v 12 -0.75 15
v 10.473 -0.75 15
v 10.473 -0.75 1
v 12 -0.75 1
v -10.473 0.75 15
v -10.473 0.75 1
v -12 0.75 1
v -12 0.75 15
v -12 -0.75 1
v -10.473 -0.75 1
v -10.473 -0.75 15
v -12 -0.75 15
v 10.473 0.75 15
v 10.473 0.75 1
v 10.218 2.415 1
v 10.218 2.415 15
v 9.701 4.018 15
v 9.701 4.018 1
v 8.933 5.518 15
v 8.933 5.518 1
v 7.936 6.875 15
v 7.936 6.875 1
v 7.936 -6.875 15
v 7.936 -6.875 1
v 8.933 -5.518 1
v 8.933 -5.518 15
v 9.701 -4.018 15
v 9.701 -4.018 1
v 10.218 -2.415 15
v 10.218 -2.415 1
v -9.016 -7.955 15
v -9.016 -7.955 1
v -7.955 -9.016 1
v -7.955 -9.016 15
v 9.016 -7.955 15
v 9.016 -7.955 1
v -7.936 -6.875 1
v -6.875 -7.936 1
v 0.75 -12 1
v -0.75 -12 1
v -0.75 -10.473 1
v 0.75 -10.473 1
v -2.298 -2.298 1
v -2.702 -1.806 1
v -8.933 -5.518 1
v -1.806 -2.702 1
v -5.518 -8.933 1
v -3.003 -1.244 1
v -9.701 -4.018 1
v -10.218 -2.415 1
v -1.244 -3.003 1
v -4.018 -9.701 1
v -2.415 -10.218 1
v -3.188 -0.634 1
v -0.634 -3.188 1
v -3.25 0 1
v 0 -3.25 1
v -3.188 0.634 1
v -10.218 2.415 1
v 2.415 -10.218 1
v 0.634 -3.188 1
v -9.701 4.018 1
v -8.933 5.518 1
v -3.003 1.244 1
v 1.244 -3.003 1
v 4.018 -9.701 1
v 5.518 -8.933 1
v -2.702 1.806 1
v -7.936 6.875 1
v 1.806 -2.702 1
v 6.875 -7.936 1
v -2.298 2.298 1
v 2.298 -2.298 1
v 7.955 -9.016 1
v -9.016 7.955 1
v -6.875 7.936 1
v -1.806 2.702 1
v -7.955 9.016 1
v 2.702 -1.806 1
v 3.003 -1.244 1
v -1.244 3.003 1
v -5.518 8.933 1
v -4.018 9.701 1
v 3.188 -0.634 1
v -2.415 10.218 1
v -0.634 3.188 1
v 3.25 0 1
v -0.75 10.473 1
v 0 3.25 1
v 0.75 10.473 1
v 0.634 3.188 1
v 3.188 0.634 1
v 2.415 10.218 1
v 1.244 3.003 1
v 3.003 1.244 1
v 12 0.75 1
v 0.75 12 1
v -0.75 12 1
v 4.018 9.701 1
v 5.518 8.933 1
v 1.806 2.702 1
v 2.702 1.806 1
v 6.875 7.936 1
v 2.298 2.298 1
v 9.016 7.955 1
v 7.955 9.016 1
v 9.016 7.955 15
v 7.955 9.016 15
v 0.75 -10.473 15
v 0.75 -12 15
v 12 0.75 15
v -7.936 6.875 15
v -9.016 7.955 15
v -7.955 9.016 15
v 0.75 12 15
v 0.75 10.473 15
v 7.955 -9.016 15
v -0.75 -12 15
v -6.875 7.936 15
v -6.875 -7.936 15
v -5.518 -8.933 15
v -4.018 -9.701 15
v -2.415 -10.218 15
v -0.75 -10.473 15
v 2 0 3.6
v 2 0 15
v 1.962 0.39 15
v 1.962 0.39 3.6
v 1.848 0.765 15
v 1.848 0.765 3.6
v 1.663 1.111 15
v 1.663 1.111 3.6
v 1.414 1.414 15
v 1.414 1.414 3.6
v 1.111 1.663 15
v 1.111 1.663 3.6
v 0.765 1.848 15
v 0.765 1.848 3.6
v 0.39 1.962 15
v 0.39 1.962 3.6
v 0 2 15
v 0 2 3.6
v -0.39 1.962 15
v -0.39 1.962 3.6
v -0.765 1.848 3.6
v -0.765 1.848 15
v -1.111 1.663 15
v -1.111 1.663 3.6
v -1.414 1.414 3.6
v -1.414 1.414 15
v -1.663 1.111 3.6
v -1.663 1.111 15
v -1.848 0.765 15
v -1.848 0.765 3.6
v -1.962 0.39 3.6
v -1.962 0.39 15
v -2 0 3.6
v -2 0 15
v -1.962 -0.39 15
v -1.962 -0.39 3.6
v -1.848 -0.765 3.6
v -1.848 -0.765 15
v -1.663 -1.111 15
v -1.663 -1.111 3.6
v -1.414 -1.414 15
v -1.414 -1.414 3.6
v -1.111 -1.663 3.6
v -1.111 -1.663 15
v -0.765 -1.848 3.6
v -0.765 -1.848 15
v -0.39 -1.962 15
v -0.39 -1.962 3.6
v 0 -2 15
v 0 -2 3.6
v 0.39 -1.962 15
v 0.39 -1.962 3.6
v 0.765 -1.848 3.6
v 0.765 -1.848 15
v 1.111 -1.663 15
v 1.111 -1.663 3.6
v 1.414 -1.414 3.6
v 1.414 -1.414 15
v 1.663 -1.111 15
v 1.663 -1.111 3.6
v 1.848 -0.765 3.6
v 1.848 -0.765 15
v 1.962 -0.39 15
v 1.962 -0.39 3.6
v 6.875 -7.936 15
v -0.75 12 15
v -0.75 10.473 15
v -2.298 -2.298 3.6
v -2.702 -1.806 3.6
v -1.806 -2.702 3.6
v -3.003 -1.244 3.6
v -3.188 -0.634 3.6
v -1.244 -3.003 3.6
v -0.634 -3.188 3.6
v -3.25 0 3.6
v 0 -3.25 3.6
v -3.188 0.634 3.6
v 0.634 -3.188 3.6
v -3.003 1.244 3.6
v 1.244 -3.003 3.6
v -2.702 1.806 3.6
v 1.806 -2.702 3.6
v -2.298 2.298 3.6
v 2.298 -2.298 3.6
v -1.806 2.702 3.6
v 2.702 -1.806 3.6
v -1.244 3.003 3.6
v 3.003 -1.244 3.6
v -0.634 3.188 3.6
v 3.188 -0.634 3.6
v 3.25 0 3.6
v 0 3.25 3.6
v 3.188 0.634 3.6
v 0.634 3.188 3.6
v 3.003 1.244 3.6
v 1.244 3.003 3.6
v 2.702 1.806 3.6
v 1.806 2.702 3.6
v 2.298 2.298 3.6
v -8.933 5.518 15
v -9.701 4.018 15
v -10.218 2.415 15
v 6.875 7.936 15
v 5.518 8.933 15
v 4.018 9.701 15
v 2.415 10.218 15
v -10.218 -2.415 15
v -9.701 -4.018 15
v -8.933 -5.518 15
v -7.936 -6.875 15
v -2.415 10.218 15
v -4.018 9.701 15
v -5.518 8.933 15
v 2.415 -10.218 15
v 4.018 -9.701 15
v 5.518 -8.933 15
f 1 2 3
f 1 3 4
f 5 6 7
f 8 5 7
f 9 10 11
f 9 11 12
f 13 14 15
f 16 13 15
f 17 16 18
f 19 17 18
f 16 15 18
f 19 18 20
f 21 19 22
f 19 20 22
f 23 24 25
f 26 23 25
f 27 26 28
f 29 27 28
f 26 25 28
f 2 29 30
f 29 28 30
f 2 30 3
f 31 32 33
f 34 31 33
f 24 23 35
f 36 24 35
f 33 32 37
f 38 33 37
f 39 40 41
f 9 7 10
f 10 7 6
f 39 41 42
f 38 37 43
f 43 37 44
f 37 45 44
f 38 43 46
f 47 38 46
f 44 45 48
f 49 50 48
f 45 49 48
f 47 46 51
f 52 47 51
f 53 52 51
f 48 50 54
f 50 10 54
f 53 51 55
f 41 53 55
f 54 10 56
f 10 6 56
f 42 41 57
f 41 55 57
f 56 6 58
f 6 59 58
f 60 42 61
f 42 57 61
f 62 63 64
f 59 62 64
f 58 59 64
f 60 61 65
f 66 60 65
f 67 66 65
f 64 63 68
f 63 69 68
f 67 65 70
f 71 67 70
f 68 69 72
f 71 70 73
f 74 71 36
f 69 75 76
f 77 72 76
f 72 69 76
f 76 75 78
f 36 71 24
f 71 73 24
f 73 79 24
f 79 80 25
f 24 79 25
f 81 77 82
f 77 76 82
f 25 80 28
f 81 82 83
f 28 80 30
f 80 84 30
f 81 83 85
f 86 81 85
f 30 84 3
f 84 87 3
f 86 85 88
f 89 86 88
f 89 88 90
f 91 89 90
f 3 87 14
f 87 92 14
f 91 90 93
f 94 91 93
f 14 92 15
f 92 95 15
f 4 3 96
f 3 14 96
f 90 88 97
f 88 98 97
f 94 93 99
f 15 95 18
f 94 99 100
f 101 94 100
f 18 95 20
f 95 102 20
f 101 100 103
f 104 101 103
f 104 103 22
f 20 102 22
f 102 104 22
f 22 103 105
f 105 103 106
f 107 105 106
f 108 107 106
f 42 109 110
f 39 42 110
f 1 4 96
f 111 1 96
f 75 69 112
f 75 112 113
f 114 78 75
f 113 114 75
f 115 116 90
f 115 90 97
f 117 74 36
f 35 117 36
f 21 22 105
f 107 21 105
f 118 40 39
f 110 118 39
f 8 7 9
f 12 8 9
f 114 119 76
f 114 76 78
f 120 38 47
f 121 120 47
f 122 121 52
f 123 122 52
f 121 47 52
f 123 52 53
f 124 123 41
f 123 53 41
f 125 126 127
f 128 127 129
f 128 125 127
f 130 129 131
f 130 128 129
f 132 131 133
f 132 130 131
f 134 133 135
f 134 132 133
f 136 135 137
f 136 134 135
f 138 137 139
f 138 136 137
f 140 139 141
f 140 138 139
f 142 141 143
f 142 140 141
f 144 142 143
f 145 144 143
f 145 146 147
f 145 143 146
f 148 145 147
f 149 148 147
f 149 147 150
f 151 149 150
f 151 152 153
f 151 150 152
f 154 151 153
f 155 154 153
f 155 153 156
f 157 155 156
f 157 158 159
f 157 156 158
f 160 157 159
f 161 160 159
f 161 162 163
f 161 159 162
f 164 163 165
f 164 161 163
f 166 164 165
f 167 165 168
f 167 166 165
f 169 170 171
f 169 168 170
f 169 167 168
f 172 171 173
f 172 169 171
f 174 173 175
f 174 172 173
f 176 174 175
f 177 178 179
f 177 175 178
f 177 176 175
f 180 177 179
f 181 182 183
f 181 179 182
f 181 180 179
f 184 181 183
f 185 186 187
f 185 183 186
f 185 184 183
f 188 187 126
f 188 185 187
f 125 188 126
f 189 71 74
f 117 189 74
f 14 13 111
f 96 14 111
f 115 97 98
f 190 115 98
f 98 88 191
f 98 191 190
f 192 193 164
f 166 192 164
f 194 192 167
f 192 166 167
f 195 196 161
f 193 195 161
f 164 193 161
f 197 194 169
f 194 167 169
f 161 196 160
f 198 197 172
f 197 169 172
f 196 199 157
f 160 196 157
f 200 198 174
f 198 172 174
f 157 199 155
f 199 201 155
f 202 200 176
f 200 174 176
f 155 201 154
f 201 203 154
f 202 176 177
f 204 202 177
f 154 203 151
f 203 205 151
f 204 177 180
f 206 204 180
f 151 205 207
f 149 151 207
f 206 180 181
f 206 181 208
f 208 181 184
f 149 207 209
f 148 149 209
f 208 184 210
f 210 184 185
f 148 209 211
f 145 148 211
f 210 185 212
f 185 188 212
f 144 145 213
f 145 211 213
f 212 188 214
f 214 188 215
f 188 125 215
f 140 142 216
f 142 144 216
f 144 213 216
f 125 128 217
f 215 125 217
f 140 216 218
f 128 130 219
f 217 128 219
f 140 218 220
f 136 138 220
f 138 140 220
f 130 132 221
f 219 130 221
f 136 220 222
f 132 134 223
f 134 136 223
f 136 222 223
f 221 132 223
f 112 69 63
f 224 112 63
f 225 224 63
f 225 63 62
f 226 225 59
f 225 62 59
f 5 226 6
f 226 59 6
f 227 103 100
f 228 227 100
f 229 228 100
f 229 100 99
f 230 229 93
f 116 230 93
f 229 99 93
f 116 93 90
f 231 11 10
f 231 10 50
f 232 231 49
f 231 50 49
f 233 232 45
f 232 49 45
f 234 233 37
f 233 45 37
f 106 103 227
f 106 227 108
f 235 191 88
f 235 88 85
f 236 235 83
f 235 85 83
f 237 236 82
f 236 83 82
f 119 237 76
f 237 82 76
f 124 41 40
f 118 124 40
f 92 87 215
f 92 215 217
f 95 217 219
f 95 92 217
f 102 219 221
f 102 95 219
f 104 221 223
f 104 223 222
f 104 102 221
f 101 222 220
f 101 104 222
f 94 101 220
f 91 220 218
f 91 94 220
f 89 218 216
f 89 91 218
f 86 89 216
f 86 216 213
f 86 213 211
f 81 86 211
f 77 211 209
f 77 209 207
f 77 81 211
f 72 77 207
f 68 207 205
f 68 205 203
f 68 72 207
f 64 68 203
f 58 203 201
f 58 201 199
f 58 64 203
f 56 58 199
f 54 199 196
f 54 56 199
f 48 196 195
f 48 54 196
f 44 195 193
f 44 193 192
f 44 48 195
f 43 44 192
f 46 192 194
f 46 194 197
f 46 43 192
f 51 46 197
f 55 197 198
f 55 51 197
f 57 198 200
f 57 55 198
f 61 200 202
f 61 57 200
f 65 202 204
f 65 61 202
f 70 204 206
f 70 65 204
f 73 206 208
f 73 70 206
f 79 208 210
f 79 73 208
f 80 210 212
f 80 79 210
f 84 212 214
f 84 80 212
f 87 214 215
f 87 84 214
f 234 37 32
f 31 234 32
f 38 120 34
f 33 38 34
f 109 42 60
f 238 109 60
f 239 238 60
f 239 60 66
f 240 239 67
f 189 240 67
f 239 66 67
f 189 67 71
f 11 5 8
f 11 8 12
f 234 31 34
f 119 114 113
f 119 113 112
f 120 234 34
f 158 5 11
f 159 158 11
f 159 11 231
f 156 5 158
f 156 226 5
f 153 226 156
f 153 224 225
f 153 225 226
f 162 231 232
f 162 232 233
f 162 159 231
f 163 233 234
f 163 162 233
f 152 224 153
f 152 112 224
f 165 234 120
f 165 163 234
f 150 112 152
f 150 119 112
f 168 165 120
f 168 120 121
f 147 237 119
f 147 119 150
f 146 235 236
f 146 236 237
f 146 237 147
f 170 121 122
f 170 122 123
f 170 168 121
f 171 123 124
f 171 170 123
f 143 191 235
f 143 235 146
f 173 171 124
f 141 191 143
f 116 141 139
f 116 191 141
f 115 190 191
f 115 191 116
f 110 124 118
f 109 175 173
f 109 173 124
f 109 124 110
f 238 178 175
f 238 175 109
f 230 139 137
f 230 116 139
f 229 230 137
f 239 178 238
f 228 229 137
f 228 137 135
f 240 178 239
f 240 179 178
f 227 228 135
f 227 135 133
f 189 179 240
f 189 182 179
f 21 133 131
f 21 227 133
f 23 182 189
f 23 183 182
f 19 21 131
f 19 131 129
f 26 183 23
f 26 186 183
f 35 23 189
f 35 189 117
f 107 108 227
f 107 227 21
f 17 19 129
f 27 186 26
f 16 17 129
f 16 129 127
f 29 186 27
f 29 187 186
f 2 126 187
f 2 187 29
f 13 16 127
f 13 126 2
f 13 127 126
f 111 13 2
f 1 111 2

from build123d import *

# Parameters (mm, degrees)
CYLINDER057_R     = 2
CYLINDER057_DEPTH = 13
CYLINDER059_R     = 3.25
CYLINDER059_DEPTH = 2.6
BOX019_W          = 6
BOX019_H          = 1.5
BOX019_DEPTH      = 14
ARRAY004_COUNT    = 8
CYLINDER055_R     = 10.5
CYLINDER055_DEPTH = 14


with BuildPart() as cylinder052:
    # Cylinder057 → Cylinder057 (new body)
    with BuildSketch(Plane.XY.offset(3.6)):
        Circle(CYLINDER057_R)
    extrude(amount=CYLINDER057_DEPTH)


with BuildPart() as cylinder054:
    # Cylinder059 → Cylinder059 (new body)
    with BuildSketch(Plane.XY.offset(1)):
        Circle(CYLINDER059_R)
    extrude(amount=CYLINDER059_DEPTH)


with BuildPart() as array004:
    # Box019 → Box019 (new body)
    with BuildSketch(Plane(origin=(6, -0.75, 0), x_dir=(1, 0, 0), z_dir=(0, 0, 1))):
        with Locations((3, 0.75)):
            Rectangle(BOX019_W, BOX019_H)
    extrude(amount=BOX019_DEPTH)

    # Array004: Array004 ×8 about axis
    array004_axis = Axis((0, 0, 0), (0, 0, 1))


with BuildPart() as array004_1:
    add(array004.part)
    for i in range(1, ARRAY004_COUNT):
        add(array004.part.rotate(array004_axis, i * 360 / ARRAY004_COUNT))


with BuildPart() as base_para_rosca_microfono_final:
    # Cylinder055 → Cylinder055 (new body)
    with BuildSketch(Plane.XY):
        Circle(CYLINDER055_R)
    extrude(amount=CYLINDER055_DEPTH)

    # Fusion021: union Array004
    add(array004_1.part)


with BuildPart() as base_para_rosca_microfono_final_1:
    # Fusion021 placement: moved
    add(base_para_rosca_microfono_final.part.moved(Location((0, 0, 1))))

    # Cut043: cut Cylinder054
    add(cylinder054.part, mode=Mode.SUBTRACT)

    # Cut044: cut Cylinder052
    add(cylinder052.part, mode=Mode.SUBTRACT)


solid = base_para_rosca_microfono_final_1.part
